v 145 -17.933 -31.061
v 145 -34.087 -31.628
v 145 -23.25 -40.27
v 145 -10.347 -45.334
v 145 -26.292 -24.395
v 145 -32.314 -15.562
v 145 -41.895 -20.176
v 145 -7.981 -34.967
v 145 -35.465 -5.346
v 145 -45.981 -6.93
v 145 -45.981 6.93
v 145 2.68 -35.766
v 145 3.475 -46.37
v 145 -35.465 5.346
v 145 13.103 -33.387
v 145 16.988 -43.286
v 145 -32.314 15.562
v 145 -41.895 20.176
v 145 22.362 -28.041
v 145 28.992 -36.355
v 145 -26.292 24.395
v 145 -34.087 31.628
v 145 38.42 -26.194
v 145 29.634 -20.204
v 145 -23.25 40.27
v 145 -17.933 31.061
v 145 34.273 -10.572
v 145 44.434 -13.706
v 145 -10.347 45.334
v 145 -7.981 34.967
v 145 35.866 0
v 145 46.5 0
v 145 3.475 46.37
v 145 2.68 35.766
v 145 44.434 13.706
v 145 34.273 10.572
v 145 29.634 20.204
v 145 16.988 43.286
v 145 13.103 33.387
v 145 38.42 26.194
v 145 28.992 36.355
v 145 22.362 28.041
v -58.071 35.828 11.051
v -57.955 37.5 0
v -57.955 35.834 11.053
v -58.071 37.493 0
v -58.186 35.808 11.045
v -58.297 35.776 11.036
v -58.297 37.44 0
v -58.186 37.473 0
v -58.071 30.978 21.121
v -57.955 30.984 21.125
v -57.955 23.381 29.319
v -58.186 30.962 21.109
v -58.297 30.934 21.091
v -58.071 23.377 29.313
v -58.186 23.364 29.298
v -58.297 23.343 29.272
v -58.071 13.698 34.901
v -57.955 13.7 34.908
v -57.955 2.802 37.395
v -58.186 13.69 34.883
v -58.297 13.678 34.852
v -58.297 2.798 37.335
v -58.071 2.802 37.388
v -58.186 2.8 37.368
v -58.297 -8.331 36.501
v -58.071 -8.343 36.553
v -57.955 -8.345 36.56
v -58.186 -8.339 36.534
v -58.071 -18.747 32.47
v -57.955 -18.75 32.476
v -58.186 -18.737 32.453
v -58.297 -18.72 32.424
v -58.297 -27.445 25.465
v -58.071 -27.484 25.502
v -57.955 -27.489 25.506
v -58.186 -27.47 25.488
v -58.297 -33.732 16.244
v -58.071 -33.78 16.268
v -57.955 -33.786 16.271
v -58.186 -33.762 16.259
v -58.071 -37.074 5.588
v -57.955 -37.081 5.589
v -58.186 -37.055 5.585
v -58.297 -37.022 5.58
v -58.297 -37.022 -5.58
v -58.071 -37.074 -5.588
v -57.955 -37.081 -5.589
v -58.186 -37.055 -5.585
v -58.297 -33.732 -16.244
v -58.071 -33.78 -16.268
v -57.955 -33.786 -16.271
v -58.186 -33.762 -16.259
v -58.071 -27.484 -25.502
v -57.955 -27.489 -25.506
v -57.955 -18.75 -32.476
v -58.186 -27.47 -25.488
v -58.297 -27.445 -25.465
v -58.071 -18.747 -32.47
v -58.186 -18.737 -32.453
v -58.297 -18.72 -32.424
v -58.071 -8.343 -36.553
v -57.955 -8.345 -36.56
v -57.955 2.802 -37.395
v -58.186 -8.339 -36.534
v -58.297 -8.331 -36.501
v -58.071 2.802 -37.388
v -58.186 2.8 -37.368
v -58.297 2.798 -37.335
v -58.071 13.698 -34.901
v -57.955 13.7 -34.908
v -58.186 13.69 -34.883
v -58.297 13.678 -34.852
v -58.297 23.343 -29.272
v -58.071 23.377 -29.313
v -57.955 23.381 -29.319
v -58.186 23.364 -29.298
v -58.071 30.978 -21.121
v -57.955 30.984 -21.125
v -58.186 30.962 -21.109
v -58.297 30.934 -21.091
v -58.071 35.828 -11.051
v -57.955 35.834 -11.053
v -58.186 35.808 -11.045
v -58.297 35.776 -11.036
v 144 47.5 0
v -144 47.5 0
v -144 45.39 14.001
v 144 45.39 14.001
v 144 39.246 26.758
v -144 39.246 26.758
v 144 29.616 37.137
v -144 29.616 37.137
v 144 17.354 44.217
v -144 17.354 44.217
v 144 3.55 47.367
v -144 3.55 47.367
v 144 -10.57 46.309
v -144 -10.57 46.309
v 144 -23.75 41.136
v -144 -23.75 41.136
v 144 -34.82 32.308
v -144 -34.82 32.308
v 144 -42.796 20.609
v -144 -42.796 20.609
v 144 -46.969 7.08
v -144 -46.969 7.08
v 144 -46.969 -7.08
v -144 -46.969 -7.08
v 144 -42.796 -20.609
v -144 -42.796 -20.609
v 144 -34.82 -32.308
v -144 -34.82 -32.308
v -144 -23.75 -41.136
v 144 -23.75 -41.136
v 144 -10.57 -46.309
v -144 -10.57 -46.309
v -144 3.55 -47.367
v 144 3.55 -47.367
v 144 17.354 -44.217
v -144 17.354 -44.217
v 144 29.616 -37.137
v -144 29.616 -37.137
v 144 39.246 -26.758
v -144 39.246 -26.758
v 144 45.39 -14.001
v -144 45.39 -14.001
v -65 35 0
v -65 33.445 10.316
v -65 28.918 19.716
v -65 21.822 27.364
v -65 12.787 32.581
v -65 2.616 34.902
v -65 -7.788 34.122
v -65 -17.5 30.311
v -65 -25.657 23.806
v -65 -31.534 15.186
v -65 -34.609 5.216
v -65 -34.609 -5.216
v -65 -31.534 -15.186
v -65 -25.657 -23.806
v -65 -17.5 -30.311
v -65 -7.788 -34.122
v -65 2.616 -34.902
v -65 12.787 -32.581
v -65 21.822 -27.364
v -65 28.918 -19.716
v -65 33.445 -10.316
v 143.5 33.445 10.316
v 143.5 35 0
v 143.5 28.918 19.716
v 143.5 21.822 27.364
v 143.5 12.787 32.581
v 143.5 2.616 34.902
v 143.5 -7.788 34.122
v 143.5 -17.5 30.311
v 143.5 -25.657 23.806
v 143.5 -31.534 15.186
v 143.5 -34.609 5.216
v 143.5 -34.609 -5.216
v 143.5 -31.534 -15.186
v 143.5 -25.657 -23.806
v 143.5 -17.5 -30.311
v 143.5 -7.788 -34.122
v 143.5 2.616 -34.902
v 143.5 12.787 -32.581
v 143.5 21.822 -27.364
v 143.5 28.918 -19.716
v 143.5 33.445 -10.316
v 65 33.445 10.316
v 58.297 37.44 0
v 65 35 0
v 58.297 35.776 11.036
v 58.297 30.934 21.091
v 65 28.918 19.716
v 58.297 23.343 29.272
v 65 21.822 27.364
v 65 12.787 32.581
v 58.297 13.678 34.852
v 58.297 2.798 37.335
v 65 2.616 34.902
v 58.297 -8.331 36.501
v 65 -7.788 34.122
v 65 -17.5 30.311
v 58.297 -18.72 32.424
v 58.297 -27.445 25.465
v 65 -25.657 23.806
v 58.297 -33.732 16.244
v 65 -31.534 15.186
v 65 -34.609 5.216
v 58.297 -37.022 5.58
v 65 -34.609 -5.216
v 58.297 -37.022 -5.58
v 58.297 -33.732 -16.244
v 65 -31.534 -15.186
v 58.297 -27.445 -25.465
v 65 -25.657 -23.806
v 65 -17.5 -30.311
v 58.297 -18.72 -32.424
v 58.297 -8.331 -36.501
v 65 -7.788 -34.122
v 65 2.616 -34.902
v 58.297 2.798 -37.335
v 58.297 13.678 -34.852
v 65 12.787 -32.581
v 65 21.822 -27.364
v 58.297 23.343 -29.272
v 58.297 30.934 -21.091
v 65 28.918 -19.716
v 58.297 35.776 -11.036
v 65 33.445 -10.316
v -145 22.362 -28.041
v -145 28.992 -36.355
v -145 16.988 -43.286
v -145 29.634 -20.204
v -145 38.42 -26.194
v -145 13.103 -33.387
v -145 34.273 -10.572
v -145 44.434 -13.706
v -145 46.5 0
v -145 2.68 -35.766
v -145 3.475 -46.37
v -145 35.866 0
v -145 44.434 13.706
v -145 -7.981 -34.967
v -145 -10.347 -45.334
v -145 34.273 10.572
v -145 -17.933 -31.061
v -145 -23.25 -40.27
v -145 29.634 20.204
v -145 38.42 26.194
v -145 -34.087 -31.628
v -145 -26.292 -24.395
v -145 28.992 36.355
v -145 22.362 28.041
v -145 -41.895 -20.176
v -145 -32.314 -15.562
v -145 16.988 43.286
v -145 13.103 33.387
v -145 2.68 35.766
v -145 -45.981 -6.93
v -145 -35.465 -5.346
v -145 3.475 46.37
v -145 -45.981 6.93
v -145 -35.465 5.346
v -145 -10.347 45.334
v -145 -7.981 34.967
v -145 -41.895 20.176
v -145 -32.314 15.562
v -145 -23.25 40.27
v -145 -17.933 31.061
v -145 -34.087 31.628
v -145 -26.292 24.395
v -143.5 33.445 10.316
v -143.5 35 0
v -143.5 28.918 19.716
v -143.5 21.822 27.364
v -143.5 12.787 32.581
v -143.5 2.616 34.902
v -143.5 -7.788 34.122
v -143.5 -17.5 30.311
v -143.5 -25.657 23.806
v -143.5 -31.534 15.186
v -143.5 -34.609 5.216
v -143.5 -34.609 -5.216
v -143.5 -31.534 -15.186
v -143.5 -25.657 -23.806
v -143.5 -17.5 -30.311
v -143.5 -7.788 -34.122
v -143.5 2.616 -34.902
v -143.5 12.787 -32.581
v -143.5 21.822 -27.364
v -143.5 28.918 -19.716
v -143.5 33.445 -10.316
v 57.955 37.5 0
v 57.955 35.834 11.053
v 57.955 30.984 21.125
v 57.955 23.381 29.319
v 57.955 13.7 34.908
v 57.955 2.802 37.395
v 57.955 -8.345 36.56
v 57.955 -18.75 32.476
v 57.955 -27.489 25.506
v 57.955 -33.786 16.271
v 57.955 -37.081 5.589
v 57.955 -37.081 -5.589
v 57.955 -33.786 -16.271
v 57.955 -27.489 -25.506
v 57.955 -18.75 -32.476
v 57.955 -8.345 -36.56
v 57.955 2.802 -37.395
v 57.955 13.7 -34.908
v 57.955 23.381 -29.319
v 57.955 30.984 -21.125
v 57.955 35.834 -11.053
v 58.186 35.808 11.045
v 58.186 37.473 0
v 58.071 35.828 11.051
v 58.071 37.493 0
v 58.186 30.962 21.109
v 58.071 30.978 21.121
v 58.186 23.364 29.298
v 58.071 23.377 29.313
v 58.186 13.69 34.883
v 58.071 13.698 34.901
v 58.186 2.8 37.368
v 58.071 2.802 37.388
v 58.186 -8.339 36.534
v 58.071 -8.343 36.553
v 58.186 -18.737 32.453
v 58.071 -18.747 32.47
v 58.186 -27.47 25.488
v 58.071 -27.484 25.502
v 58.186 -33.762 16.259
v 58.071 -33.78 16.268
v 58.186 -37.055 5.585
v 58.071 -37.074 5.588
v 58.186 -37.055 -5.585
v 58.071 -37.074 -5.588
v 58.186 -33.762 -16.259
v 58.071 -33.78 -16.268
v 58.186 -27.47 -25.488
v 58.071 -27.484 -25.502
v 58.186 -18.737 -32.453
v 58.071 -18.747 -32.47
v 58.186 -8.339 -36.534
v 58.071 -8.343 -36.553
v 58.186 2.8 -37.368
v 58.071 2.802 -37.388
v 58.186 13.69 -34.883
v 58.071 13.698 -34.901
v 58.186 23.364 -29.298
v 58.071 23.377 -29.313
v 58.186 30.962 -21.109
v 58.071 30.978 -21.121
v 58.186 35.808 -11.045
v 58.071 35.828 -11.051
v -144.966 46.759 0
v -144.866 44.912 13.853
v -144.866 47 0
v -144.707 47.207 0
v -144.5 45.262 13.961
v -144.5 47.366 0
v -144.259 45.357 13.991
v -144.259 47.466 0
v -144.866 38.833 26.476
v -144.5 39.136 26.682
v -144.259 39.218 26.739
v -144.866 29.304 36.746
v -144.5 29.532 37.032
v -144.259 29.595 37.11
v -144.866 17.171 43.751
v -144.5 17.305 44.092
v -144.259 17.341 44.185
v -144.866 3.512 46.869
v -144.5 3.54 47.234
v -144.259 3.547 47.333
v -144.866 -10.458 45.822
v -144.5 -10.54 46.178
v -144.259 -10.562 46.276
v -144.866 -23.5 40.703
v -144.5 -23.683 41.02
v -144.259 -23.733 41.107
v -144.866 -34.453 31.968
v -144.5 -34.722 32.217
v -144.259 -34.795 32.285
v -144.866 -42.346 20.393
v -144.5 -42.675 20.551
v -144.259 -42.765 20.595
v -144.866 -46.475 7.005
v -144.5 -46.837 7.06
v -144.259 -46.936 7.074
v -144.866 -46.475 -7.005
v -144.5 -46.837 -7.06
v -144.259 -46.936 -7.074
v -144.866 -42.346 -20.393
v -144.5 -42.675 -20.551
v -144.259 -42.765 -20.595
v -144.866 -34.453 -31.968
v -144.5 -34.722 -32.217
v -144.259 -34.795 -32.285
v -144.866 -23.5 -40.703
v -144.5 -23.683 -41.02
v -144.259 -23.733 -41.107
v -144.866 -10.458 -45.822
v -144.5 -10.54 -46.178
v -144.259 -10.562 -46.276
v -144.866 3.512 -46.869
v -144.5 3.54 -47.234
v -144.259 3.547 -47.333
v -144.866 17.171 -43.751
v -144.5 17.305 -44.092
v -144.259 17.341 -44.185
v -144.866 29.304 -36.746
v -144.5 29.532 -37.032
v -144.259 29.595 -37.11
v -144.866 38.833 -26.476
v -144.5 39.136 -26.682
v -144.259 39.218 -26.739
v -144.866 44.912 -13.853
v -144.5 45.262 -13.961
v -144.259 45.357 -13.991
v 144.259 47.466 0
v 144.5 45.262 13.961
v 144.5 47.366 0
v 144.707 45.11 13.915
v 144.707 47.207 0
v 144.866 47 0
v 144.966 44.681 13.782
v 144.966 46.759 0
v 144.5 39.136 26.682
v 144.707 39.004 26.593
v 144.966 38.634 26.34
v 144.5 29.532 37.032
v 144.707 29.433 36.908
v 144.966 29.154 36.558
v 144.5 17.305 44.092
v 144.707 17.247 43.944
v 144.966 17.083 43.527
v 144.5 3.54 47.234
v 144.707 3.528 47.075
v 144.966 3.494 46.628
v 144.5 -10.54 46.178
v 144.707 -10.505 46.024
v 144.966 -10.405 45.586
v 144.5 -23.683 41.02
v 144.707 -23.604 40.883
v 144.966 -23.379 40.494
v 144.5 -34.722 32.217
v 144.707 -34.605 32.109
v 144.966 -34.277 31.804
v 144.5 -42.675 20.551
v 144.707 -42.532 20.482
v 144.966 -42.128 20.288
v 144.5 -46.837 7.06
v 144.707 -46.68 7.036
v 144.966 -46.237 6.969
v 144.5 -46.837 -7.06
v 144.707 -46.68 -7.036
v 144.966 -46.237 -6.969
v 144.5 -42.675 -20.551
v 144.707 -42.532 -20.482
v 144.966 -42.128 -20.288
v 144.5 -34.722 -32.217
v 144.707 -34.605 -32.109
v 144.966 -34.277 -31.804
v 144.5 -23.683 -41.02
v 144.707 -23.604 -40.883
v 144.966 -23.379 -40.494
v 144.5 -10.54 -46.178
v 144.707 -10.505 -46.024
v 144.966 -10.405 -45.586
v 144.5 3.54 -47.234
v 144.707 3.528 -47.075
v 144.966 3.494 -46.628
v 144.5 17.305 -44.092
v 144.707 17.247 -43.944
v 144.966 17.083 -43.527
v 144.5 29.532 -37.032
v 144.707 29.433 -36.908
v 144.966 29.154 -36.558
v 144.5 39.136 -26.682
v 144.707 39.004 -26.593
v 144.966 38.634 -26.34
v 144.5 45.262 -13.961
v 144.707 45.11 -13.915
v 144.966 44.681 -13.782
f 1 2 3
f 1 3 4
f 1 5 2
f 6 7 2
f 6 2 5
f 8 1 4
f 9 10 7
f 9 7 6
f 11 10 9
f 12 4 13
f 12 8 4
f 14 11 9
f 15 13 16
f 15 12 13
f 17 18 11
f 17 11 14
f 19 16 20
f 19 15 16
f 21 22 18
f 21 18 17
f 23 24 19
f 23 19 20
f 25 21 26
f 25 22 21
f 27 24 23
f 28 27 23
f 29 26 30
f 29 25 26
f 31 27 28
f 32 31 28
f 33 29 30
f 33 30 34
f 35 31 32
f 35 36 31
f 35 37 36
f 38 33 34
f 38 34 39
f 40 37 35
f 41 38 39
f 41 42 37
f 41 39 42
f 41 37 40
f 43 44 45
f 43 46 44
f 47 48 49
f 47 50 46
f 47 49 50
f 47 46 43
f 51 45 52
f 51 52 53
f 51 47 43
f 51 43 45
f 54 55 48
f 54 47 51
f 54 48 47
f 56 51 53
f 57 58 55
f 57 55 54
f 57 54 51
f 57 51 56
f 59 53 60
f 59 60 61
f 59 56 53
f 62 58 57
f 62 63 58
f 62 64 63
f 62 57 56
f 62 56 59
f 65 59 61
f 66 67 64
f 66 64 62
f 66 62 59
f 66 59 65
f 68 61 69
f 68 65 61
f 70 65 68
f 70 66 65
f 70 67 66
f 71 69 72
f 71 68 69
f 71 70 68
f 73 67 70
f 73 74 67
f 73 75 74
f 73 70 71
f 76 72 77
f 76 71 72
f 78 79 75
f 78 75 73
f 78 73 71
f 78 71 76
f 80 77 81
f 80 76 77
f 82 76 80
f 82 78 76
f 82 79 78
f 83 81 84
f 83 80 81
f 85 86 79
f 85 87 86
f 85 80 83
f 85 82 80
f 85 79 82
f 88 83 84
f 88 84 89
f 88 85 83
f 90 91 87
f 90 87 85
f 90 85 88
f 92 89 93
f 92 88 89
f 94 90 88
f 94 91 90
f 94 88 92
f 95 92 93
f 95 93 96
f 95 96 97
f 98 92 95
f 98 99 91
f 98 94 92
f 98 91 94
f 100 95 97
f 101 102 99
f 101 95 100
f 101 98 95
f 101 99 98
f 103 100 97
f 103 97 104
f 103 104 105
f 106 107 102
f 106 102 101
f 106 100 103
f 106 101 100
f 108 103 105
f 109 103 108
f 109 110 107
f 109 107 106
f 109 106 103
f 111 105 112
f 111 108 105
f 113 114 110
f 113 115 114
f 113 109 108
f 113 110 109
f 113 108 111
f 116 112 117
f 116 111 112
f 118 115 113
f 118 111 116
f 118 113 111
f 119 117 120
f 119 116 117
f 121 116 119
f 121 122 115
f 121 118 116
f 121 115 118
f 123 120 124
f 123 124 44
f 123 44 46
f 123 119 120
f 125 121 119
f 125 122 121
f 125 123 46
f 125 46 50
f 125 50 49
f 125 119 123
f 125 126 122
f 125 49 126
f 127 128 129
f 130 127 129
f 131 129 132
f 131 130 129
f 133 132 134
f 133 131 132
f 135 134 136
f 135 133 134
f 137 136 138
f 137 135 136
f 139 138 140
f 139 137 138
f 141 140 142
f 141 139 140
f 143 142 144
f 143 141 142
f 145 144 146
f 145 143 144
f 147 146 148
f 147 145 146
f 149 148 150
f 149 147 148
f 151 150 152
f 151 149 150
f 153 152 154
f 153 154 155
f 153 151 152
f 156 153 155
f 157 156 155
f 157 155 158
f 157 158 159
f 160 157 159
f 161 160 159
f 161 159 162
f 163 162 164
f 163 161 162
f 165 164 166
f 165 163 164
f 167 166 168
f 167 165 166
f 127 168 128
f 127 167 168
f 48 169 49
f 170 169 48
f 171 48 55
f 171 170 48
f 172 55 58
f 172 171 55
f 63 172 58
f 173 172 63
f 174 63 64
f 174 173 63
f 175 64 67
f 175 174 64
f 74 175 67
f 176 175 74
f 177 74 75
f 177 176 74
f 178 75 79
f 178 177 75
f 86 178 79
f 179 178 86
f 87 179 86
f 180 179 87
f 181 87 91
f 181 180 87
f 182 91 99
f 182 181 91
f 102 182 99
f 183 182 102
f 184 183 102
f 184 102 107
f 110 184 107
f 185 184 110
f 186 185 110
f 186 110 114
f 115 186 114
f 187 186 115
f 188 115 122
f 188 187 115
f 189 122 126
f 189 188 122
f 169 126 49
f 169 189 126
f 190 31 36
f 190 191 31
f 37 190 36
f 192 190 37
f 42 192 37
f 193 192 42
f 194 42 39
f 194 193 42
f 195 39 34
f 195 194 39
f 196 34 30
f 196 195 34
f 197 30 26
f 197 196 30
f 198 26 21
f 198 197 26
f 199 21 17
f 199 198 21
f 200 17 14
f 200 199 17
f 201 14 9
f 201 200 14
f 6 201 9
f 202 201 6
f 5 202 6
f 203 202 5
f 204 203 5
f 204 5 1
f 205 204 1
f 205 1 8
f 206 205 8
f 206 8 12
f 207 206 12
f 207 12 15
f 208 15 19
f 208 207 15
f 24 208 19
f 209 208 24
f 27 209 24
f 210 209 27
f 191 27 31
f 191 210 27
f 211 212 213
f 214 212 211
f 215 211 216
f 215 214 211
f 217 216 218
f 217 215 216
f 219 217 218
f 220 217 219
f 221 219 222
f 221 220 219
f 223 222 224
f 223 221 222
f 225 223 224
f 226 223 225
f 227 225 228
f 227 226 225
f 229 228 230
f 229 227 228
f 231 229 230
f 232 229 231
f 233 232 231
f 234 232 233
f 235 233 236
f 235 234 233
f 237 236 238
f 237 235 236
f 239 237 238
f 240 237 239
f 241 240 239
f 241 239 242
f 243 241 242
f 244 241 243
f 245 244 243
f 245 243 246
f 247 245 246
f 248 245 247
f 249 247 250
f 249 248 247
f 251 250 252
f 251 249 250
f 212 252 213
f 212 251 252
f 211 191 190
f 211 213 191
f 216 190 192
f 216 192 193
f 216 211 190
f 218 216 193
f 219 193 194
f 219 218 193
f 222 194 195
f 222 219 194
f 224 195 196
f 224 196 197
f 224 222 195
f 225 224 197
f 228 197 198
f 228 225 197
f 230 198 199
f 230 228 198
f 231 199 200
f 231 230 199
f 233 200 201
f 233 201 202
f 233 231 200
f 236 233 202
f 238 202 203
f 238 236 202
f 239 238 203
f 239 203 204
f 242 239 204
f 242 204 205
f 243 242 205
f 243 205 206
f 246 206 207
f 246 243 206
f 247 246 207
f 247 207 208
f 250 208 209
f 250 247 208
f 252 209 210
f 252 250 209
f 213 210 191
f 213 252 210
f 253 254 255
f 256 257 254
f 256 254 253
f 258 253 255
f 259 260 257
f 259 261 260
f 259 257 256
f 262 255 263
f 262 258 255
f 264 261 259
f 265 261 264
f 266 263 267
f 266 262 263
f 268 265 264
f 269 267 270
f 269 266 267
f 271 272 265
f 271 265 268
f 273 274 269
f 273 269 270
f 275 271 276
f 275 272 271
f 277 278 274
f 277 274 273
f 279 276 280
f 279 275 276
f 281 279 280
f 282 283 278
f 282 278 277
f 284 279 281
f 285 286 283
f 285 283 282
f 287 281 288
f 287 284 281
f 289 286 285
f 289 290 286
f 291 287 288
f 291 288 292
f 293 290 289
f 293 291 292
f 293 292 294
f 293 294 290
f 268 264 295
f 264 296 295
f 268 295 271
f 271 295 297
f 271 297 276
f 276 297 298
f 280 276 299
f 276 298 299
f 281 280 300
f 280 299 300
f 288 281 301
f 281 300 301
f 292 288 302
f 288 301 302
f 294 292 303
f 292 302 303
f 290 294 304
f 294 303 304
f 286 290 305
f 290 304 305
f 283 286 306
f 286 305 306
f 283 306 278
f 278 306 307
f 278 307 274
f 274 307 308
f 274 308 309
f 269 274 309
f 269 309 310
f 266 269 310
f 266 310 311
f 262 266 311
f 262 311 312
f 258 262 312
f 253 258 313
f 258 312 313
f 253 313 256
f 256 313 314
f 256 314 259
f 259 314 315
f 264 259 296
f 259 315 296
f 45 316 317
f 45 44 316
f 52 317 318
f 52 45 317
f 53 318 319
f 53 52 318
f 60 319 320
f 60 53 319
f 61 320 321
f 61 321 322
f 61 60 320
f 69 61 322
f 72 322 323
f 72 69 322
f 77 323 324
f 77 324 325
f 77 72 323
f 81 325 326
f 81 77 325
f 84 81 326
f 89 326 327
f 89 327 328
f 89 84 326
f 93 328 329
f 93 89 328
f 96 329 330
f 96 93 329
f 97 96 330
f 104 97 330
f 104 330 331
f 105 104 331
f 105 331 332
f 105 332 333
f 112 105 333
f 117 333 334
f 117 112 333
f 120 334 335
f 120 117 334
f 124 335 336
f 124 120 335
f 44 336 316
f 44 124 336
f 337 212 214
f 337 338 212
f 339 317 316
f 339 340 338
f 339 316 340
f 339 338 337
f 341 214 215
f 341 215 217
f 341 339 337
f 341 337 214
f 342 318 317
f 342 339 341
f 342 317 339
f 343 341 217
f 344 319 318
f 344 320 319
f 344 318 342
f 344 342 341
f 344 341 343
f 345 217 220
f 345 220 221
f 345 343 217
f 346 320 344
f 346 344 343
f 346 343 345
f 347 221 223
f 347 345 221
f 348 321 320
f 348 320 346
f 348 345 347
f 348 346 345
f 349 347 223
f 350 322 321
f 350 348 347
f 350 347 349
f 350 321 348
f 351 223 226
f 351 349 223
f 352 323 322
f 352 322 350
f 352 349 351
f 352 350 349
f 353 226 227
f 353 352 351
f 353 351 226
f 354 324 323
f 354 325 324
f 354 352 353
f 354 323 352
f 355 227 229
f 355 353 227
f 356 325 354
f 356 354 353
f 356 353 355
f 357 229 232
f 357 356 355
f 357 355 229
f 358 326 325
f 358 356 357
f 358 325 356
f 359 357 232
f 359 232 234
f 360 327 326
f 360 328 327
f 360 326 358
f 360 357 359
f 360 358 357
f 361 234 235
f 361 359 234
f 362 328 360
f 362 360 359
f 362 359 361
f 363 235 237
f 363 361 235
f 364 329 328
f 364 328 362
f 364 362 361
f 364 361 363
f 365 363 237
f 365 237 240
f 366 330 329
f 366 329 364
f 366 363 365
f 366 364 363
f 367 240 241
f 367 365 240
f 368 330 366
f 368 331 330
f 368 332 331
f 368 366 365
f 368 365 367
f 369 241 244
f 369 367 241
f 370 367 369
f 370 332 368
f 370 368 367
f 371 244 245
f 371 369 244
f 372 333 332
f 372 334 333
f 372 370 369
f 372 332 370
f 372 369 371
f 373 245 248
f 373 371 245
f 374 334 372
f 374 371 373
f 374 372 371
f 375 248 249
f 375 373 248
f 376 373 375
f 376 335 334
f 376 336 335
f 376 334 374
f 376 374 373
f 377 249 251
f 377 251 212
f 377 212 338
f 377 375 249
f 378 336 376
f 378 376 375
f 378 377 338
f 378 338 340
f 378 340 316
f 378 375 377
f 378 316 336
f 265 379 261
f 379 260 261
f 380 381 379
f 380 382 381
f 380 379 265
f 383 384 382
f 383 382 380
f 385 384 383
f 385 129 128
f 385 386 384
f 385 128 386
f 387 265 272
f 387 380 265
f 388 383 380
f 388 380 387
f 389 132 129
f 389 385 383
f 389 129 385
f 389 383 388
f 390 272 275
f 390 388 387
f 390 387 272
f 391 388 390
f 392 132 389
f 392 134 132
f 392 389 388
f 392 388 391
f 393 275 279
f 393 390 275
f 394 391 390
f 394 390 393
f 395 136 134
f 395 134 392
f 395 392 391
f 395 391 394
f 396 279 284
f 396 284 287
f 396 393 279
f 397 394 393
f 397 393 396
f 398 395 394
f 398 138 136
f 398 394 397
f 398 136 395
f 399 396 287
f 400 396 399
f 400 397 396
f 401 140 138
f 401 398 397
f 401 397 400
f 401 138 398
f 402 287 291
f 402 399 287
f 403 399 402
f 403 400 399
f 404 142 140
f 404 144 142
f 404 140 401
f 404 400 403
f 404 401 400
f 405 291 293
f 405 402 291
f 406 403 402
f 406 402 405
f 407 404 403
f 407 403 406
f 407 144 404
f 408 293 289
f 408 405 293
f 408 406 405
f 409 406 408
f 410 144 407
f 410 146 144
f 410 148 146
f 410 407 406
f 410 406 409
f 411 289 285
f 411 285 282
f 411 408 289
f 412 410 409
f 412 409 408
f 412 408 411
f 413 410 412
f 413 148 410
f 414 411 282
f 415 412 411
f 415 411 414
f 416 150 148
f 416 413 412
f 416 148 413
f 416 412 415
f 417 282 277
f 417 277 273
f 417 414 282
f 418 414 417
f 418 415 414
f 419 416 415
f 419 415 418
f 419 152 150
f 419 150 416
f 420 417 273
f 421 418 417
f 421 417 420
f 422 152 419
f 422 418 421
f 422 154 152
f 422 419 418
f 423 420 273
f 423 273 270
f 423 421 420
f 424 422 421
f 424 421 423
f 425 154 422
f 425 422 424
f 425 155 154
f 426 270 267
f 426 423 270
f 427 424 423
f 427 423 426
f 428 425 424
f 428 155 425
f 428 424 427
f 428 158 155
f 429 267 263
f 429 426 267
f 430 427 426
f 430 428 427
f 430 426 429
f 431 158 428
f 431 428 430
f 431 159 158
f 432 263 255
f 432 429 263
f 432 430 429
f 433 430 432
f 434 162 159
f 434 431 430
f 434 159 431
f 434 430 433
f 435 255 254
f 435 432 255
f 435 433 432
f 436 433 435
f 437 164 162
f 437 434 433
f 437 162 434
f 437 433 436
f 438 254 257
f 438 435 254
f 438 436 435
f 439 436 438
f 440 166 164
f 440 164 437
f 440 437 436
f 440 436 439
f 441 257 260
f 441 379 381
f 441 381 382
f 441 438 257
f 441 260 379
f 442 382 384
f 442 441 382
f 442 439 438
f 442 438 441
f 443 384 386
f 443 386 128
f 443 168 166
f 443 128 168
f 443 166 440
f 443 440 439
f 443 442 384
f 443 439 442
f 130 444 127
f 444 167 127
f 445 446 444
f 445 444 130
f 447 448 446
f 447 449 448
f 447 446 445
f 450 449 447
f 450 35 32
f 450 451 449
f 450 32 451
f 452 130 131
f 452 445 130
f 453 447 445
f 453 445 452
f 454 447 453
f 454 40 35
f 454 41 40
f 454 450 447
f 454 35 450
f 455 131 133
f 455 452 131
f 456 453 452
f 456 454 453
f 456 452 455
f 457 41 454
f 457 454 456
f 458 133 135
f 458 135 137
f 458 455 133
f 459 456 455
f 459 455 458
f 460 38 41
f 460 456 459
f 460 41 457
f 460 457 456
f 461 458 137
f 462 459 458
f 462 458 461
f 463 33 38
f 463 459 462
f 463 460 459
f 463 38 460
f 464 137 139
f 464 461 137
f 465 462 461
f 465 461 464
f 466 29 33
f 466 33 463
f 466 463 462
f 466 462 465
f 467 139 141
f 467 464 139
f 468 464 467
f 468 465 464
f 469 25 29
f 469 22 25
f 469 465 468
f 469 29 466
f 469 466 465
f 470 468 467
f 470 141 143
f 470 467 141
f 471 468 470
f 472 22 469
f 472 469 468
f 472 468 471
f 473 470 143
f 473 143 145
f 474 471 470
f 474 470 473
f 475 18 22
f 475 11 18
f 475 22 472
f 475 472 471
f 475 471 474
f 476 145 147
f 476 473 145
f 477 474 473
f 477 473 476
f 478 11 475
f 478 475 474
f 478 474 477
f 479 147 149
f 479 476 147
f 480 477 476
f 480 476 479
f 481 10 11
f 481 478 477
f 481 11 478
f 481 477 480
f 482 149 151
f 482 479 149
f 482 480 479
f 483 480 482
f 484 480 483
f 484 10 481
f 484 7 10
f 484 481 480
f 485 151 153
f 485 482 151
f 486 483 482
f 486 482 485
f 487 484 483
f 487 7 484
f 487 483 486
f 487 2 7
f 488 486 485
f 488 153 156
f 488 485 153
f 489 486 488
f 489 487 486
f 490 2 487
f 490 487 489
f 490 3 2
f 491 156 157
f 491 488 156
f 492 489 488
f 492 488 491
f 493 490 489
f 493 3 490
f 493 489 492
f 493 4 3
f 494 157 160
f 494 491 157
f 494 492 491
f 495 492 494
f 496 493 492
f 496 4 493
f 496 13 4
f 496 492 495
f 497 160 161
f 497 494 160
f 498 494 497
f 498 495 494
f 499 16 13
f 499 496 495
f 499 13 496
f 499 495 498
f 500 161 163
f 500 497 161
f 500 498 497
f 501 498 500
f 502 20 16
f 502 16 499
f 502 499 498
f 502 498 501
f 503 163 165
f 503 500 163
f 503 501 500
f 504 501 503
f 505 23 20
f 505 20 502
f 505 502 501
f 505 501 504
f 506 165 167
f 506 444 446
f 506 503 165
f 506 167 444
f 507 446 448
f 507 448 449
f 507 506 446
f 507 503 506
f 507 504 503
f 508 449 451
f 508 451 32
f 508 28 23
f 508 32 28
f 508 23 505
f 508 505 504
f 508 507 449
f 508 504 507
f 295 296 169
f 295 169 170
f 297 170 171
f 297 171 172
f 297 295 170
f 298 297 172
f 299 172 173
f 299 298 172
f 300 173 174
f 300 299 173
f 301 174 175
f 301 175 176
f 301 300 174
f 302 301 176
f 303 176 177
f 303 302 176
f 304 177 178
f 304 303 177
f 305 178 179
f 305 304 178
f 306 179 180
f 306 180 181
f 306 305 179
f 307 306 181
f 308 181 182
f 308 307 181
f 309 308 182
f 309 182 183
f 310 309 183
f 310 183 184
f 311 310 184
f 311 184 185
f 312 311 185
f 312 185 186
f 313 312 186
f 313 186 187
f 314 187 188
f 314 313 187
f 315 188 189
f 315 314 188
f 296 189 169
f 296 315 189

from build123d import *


with BuildPart() as part:
    # Sketch1 → Base-Revolve (revolve)
    with BuildSketch(Plane.XY):
        with BuildLine():
            Line((-145, 35), (-145, 46.5))
            ThreePointArc((-145, 46.5), (-144.707106781, 47.207106781), (-144, 47.5))
            Line((-144, 47.5), (144, 47.5))
            ThreePointArc((144, 47.5), (144.707106781, 47.207106781), (145, 46.5))
            Line((145, 46.5), (145, 35))
            Line((145, 35), (65, 35))
            Line((65, 35), (58.296999614, 37.439692621))
            ThreePointArc((58.296999614, 37.439692621), (58.128627648, 37.484807753), (57.954979471, 37.5))
            Line((57.954979471, 37.5), (-57.954979471, 37.5))
            ThreePointArc((-57.954979471, 37.5), (-58.128627648, 37.484807753), (-58.296999614, 37.439692621))
            Line((-58.296999614, 37.439692621), (-65, 35))
            Line((-65, 35), (-145, 35))
        make_face()
    revolve(axis=Axis((-145, 0, 0), (1, 0, 0)))

    # Sketch5 → 2.5 x 30 gr reifning (revolve, cut)
    with BuildSketch(Plane.XY):
        Polygon((145, 35.866025404), (143.5, 35), (145, 35), align=None)
        Polygon((-145, 35), (-145, 35.866025404), (-143.5, 35), align=None)
    revolve(axis=Axis((0, 0, 0), (1, 0, 0)), mode=Mode.SUBTRACT)


solid = part.part
